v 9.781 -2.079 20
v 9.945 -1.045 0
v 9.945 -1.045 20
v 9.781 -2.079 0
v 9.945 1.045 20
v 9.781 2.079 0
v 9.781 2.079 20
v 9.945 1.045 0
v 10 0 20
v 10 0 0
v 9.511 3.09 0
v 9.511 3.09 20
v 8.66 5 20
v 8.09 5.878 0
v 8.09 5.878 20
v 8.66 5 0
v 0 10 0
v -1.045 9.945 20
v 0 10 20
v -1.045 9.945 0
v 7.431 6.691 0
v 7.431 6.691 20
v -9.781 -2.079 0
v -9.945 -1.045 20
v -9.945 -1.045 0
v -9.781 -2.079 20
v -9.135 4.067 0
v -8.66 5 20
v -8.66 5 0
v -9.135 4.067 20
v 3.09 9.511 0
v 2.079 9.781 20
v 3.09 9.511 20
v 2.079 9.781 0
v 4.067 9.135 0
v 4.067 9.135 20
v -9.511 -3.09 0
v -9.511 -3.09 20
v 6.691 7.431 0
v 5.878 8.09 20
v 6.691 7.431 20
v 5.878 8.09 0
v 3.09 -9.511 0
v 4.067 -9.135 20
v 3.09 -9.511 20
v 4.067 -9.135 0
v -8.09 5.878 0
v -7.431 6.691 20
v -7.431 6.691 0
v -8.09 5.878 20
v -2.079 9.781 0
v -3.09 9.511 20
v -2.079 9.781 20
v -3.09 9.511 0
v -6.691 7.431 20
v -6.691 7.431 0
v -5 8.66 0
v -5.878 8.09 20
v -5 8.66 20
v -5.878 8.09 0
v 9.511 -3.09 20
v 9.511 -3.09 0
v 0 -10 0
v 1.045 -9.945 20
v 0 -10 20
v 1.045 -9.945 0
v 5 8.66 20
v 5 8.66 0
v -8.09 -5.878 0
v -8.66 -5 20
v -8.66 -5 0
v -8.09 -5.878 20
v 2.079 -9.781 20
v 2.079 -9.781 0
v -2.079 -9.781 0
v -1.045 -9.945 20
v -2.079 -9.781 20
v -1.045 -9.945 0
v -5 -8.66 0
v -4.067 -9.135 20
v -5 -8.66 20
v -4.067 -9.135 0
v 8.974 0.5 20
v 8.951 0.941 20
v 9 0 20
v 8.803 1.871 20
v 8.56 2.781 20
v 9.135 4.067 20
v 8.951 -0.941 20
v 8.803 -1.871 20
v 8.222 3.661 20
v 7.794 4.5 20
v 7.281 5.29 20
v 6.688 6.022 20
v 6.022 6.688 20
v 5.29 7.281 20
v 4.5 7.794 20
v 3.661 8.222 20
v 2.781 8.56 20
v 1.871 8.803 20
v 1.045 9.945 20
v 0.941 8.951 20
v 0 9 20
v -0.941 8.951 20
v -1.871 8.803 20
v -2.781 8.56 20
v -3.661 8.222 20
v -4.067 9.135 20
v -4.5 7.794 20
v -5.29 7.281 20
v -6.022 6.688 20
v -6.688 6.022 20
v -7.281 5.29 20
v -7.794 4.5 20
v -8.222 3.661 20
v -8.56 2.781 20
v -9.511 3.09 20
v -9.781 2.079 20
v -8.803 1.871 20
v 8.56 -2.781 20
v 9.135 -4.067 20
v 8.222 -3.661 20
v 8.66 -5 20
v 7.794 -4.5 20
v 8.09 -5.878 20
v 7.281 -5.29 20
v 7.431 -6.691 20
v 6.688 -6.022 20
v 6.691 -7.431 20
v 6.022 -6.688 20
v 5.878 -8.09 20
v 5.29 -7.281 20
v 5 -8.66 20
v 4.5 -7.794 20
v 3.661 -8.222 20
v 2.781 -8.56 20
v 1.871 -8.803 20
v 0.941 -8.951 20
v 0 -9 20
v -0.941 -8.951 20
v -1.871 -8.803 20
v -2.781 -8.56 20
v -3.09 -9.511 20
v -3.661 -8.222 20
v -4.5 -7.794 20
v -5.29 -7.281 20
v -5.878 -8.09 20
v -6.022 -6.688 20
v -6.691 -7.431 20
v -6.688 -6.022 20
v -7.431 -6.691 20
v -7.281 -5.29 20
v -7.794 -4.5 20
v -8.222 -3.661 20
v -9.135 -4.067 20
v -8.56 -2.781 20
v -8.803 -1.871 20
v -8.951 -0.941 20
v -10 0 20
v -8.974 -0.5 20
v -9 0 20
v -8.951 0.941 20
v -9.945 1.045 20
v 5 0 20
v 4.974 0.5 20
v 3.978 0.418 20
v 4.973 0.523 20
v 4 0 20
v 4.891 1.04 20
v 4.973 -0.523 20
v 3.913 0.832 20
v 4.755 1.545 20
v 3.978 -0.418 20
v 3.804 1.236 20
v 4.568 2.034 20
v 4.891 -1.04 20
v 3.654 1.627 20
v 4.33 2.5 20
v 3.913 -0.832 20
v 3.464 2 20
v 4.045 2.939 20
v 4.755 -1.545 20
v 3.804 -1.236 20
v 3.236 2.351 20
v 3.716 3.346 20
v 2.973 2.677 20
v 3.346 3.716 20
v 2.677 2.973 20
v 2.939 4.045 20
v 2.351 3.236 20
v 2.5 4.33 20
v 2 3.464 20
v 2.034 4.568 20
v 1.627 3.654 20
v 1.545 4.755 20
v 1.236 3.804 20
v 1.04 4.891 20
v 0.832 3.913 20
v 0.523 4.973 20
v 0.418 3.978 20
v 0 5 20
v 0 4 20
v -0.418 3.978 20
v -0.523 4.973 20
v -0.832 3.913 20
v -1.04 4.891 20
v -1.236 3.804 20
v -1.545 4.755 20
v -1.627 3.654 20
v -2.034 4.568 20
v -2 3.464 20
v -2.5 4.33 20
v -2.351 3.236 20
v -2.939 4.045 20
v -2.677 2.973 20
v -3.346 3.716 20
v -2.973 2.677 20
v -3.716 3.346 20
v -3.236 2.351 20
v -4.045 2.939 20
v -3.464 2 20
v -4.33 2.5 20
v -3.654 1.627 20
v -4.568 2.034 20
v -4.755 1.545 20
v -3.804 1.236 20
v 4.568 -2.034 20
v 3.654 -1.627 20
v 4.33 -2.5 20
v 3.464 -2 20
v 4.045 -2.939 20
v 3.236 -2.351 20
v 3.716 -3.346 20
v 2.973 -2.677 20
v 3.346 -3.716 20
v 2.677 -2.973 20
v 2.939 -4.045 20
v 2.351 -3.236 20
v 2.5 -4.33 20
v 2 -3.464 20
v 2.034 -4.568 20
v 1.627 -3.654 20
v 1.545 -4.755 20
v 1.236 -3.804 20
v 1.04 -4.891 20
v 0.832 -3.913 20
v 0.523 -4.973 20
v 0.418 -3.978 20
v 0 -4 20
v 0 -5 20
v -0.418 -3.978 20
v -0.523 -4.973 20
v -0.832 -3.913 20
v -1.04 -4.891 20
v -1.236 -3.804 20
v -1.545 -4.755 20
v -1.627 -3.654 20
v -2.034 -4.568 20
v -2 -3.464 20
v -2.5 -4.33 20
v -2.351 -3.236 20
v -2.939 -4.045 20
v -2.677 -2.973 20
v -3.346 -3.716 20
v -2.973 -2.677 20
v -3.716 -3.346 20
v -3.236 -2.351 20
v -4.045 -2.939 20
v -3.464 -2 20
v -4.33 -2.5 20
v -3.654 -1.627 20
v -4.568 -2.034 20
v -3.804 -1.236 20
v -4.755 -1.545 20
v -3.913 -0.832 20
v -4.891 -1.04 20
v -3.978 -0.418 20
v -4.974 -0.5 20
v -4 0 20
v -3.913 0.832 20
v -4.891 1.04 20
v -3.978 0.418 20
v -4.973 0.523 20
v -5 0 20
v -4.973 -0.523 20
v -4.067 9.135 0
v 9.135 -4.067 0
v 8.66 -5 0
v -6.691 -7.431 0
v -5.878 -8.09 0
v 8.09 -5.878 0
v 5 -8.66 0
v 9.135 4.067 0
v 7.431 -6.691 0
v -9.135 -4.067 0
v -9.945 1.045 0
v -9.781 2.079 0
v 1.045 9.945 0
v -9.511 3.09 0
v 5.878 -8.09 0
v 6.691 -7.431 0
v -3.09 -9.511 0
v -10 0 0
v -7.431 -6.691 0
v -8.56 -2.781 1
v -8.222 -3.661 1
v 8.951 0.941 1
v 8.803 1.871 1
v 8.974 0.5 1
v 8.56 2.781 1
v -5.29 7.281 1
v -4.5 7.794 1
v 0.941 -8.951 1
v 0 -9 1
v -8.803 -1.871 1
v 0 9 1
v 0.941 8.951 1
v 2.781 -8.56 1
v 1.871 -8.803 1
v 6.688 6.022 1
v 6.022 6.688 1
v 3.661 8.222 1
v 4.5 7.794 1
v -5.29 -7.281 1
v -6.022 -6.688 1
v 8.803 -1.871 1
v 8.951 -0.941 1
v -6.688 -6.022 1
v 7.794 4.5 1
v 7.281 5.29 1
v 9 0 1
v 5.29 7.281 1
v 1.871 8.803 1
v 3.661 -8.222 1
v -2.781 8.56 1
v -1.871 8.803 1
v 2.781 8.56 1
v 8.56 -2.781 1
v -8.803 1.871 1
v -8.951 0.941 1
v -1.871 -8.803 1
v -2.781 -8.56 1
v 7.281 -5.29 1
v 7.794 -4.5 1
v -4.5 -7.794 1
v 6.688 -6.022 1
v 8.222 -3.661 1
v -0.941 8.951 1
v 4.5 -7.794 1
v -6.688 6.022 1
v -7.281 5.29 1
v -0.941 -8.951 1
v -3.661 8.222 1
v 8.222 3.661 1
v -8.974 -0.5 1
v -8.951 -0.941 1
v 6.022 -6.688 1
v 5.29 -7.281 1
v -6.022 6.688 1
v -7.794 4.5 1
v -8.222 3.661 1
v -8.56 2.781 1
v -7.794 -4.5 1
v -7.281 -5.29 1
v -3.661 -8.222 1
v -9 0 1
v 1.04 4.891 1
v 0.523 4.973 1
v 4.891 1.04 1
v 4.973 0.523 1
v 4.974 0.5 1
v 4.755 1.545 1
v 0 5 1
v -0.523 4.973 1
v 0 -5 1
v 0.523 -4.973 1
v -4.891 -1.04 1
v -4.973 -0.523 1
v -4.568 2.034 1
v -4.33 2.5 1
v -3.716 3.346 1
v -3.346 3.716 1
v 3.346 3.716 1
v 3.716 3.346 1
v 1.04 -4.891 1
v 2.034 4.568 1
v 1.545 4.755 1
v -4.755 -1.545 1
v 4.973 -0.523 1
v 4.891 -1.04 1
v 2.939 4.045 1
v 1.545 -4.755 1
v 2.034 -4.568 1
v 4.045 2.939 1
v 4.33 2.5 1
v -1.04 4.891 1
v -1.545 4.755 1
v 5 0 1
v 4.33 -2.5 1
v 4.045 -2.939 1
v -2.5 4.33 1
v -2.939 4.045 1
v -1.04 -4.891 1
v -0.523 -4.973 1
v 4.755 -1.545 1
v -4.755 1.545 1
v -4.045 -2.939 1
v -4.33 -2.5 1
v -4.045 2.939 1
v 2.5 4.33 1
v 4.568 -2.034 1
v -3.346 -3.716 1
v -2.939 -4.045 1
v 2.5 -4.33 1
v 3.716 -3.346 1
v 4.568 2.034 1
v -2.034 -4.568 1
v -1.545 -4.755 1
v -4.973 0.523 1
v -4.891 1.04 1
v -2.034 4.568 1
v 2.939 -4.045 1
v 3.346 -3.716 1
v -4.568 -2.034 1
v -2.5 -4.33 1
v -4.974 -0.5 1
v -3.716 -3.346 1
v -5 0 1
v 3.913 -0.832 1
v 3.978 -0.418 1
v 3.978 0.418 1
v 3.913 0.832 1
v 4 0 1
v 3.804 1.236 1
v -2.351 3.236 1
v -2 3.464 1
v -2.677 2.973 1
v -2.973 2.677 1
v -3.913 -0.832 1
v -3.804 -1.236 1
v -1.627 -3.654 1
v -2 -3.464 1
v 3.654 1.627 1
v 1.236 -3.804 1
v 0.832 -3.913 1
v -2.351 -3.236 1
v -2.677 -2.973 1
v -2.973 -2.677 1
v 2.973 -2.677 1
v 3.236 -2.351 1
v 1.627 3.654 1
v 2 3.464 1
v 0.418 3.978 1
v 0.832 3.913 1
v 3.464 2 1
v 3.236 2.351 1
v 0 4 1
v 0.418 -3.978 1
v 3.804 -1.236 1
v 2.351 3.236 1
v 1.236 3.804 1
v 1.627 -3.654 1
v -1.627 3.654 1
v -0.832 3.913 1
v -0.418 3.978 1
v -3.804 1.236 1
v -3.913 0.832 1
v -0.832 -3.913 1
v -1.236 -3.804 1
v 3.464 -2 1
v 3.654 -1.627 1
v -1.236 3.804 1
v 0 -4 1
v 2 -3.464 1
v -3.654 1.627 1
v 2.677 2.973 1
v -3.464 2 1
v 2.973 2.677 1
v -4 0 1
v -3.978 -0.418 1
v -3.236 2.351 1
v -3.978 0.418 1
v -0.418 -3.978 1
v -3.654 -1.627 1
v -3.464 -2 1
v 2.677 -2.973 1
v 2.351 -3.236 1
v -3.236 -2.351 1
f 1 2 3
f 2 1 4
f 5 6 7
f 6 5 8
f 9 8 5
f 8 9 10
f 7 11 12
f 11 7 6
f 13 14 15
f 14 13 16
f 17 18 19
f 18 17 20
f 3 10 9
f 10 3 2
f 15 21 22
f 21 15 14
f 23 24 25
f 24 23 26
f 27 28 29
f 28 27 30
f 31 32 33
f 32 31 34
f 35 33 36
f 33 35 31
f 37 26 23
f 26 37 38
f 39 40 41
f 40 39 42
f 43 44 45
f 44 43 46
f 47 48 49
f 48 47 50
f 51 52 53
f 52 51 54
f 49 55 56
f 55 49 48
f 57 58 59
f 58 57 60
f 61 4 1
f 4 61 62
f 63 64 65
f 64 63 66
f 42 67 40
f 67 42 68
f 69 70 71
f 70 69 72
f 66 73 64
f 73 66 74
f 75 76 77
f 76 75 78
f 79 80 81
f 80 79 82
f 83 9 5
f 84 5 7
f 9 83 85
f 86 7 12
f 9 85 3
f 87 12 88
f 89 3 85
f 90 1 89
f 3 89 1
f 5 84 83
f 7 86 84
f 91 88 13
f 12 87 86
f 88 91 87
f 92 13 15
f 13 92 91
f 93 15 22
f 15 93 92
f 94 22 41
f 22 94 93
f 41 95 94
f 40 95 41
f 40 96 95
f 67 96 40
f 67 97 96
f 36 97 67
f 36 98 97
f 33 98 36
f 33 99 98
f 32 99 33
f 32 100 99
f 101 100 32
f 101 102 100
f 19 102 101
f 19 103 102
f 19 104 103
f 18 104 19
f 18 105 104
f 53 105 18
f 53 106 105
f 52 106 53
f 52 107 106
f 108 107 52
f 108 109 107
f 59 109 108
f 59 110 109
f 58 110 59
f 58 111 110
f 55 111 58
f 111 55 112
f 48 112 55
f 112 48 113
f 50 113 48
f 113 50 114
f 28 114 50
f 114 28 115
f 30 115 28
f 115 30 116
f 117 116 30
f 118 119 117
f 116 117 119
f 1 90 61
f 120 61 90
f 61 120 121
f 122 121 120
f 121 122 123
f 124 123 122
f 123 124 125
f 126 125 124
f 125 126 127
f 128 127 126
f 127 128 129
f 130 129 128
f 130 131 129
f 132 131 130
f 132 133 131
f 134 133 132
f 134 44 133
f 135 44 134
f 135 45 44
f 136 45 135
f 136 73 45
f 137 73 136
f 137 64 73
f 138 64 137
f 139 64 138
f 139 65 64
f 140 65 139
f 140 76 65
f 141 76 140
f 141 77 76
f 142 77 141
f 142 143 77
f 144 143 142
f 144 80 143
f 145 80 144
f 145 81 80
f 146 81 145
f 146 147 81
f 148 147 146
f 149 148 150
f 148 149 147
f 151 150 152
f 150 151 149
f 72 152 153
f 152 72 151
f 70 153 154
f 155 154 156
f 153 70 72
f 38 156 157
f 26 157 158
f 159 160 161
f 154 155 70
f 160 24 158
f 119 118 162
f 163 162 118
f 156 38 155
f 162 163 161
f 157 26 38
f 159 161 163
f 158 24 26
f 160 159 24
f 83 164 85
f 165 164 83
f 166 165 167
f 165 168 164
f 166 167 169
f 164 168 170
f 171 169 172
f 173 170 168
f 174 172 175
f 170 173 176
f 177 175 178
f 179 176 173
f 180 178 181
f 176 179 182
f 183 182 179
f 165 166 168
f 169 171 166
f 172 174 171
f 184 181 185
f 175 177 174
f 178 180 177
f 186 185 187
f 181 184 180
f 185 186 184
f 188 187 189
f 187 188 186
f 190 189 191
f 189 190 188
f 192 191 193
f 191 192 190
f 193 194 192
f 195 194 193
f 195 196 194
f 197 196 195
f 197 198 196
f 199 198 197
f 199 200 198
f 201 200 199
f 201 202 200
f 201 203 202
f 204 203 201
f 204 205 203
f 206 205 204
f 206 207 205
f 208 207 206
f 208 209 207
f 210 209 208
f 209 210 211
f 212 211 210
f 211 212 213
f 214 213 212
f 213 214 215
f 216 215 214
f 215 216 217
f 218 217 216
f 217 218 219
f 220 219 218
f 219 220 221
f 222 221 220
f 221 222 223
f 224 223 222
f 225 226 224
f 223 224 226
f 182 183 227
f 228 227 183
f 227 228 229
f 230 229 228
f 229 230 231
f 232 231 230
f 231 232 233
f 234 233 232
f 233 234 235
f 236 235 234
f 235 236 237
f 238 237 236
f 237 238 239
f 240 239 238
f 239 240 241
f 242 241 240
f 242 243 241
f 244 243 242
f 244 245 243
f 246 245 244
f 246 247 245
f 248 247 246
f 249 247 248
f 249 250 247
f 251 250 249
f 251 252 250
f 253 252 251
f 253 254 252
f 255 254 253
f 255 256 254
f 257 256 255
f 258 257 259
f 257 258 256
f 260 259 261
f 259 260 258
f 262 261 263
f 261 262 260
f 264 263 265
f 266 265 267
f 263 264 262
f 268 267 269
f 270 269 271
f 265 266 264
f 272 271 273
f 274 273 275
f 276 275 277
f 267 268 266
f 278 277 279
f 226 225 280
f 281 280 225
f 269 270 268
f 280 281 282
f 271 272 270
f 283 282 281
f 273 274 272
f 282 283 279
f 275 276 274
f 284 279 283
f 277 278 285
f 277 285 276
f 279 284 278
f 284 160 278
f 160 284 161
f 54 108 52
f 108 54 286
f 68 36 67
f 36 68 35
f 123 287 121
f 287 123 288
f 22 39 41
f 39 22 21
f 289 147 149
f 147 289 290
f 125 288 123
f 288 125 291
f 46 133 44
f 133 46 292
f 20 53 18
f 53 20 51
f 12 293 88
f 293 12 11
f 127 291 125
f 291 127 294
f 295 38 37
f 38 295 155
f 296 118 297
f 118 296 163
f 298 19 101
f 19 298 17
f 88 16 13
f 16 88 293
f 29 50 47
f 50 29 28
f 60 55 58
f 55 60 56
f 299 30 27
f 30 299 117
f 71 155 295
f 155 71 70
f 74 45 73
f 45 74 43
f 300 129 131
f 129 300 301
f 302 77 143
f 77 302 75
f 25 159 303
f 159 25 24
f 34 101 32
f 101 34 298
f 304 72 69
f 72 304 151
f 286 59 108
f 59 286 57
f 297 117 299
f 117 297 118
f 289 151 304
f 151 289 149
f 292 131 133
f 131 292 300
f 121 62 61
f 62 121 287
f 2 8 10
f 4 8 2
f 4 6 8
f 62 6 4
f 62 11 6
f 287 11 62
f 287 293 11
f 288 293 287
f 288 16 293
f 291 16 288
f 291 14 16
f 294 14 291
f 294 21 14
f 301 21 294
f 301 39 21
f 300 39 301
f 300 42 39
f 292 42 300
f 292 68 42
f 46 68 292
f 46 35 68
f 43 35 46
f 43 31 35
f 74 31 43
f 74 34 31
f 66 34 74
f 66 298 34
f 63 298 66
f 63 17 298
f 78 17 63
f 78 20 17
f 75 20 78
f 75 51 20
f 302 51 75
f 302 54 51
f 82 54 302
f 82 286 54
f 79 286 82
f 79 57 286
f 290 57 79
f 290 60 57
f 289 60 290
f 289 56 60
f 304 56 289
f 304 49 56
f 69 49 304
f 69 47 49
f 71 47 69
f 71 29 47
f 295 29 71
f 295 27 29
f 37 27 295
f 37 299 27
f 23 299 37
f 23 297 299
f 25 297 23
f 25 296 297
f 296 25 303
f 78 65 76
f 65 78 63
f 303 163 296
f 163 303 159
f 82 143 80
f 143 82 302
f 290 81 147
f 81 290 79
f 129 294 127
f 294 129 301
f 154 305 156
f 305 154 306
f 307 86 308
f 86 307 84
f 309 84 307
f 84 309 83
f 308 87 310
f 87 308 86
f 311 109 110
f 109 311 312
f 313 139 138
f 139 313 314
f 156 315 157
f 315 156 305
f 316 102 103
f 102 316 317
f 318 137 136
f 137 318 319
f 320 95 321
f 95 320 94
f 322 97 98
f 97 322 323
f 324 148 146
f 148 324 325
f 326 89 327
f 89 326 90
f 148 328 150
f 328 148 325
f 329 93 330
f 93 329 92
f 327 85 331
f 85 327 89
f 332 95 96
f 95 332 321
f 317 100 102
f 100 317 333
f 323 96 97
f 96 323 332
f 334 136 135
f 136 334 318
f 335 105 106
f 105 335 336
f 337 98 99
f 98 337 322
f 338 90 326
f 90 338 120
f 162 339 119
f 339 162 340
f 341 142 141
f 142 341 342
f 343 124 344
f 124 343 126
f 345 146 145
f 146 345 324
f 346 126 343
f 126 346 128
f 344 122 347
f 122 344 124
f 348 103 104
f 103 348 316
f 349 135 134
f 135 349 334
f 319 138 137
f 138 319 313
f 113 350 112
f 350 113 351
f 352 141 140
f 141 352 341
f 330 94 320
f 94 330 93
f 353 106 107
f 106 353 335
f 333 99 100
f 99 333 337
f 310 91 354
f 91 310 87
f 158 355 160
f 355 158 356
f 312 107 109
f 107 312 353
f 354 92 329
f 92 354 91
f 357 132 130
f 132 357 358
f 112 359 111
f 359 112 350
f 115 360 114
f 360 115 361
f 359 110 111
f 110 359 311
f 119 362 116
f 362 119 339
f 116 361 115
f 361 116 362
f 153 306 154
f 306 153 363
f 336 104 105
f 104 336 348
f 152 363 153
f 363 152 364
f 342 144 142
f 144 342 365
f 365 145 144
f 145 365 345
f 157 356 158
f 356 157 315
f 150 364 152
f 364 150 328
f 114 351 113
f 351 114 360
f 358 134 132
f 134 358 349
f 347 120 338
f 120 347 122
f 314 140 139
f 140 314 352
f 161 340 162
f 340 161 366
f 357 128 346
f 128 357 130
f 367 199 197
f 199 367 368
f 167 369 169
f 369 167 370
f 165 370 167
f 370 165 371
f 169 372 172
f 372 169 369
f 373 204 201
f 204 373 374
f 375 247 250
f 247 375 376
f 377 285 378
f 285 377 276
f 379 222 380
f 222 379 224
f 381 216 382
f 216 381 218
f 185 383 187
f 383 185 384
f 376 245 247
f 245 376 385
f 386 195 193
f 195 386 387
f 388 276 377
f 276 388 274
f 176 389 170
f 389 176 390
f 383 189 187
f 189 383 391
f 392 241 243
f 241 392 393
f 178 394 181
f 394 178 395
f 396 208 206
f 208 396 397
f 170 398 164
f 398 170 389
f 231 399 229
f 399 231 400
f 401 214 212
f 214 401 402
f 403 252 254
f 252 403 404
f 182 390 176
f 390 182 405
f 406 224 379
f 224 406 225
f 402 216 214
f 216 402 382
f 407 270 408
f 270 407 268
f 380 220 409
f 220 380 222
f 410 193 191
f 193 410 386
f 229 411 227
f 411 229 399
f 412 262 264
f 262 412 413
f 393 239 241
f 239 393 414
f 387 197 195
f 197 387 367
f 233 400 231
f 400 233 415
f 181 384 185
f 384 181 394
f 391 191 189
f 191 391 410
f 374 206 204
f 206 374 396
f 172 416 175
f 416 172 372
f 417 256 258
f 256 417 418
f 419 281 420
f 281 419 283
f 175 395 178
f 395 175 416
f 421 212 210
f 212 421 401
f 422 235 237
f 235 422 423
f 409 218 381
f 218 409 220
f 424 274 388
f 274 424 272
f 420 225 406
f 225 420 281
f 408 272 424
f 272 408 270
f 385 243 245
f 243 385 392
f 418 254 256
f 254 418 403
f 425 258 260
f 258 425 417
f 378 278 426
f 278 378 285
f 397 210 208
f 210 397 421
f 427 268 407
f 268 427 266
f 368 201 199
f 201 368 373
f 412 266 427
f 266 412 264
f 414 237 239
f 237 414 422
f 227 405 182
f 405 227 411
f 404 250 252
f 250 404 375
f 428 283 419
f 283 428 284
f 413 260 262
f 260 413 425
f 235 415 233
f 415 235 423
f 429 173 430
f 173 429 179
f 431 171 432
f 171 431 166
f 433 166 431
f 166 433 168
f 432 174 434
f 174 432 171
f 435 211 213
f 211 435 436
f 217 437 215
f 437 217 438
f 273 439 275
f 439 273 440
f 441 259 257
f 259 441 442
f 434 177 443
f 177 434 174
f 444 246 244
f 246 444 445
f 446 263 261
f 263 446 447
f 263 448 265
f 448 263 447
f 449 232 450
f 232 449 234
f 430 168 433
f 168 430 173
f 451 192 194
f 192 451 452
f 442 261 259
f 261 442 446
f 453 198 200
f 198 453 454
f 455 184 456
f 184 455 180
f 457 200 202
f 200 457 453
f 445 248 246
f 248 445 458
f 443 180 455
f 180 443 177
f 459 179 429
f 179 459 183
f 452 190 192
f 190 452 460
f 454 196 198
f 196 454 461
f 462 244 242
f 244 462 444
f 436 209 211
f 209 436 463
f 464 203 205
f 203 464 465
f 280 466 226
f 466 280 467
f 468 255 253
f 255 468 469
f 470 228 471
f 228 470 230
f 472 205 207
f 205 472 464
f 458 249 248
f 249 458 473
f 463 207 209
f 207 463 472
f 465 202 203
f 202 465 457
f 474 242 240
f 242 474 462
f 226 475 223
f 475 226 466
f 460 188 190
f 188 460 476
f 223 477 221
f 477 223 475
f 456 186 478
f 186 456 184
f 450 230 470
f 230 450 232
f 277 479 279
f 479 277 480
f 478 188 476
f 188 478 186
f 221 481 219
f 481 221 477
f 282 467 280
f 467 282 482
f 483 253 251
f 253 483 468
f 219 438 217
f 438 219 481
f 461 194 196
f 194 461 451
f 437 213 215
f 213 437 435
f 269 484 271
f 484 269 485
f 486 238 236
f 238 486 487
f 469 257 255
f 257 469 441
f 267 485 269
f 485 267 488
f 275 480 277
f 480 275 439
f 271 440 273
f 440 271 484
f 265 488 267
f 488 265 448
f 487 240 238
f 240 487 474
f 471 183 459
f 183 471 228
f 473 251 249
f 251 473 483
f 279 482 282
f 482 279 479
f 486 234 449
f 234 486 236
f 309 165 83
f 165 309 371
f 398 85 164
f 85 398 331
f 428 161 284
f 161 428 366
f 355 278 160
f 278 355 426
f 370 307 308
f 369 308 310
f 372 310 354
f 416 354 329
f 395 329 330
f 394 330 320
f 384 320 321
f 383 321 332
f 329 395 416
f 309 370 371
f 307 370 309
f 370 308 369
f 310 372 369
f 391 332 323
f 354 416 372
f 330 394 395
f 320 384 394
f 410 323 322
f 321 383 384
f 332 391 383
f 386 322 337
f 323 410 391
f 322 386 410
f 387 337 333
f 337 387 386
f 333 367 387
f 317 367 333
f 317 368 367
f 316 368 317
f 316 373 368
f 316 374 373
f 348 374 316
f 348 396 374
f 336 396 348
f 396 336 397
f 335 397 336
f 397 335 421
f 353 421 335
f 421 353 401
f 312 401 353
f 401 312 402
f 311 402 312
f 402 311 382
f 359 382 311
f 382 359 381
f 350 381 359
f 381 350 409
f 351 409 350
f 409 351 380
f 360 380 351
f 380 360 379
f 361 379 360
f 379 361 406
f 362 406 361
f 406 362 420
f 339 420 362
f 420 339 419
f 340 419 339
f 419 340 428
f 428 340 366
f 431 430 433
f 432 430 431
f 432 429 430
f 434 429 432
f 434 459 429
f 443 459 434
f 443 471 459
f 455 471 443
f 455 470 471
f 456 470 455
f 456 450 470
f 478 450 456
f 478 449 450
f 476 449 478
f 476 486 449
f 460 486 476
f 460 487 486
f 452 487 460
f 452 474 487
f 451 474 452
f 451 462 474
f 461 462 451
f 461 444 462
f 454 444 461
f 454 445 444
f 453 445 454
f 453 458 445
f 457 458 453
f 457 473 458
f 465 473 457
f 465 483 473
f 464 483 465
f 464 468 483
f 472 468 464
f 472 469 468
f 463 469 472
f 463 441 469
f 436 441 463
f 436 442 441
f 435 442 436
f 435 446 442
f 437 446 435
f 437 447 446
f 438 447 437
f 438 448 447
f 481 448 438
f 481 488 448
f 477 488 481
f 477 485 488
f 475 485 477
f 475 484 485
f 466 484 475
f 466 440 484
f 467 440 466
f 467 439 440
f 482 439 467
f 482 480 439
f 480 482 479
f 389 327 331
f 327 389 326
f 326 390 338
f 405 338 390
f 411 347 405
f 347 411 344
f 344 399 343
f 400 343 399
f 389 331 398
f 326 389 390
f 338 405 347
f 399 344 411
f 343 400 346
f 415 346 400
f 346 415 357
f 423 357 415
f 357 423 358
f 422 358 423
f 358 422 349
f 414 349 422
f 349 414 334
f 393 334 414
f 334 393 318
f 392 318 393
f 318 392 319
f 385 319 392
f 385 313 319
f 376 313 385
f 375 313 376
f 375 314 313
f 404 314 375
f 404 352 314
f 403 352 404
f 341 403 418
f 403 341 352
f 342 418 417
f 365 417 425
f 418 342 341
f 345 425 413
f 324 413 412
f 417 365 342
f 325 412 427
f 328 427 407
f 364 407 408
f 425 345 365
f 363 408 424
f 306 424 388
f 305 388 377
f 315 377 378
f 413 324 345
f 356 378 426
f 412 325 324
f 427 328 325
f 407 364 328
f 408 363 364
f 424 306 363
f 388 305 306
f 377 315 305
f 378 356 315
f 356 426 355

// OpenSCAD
$fn = 60;
difference() {
  cylinder(r=10, h=20);
  translate([0,0,-1]) cylinder(r=9, h=22);
}
difference() {
  cylinder(r=5, h=20);
  cylinder(r=4, h=22);
}

difference(){
  cylinder(r=10, h=1);
  //where the holes should go  
}

for(i = [0:1]) {
  rotate([0,0, 180 * i]) translate([4,0,0]) cube([5, 0.5, 20]);
}
